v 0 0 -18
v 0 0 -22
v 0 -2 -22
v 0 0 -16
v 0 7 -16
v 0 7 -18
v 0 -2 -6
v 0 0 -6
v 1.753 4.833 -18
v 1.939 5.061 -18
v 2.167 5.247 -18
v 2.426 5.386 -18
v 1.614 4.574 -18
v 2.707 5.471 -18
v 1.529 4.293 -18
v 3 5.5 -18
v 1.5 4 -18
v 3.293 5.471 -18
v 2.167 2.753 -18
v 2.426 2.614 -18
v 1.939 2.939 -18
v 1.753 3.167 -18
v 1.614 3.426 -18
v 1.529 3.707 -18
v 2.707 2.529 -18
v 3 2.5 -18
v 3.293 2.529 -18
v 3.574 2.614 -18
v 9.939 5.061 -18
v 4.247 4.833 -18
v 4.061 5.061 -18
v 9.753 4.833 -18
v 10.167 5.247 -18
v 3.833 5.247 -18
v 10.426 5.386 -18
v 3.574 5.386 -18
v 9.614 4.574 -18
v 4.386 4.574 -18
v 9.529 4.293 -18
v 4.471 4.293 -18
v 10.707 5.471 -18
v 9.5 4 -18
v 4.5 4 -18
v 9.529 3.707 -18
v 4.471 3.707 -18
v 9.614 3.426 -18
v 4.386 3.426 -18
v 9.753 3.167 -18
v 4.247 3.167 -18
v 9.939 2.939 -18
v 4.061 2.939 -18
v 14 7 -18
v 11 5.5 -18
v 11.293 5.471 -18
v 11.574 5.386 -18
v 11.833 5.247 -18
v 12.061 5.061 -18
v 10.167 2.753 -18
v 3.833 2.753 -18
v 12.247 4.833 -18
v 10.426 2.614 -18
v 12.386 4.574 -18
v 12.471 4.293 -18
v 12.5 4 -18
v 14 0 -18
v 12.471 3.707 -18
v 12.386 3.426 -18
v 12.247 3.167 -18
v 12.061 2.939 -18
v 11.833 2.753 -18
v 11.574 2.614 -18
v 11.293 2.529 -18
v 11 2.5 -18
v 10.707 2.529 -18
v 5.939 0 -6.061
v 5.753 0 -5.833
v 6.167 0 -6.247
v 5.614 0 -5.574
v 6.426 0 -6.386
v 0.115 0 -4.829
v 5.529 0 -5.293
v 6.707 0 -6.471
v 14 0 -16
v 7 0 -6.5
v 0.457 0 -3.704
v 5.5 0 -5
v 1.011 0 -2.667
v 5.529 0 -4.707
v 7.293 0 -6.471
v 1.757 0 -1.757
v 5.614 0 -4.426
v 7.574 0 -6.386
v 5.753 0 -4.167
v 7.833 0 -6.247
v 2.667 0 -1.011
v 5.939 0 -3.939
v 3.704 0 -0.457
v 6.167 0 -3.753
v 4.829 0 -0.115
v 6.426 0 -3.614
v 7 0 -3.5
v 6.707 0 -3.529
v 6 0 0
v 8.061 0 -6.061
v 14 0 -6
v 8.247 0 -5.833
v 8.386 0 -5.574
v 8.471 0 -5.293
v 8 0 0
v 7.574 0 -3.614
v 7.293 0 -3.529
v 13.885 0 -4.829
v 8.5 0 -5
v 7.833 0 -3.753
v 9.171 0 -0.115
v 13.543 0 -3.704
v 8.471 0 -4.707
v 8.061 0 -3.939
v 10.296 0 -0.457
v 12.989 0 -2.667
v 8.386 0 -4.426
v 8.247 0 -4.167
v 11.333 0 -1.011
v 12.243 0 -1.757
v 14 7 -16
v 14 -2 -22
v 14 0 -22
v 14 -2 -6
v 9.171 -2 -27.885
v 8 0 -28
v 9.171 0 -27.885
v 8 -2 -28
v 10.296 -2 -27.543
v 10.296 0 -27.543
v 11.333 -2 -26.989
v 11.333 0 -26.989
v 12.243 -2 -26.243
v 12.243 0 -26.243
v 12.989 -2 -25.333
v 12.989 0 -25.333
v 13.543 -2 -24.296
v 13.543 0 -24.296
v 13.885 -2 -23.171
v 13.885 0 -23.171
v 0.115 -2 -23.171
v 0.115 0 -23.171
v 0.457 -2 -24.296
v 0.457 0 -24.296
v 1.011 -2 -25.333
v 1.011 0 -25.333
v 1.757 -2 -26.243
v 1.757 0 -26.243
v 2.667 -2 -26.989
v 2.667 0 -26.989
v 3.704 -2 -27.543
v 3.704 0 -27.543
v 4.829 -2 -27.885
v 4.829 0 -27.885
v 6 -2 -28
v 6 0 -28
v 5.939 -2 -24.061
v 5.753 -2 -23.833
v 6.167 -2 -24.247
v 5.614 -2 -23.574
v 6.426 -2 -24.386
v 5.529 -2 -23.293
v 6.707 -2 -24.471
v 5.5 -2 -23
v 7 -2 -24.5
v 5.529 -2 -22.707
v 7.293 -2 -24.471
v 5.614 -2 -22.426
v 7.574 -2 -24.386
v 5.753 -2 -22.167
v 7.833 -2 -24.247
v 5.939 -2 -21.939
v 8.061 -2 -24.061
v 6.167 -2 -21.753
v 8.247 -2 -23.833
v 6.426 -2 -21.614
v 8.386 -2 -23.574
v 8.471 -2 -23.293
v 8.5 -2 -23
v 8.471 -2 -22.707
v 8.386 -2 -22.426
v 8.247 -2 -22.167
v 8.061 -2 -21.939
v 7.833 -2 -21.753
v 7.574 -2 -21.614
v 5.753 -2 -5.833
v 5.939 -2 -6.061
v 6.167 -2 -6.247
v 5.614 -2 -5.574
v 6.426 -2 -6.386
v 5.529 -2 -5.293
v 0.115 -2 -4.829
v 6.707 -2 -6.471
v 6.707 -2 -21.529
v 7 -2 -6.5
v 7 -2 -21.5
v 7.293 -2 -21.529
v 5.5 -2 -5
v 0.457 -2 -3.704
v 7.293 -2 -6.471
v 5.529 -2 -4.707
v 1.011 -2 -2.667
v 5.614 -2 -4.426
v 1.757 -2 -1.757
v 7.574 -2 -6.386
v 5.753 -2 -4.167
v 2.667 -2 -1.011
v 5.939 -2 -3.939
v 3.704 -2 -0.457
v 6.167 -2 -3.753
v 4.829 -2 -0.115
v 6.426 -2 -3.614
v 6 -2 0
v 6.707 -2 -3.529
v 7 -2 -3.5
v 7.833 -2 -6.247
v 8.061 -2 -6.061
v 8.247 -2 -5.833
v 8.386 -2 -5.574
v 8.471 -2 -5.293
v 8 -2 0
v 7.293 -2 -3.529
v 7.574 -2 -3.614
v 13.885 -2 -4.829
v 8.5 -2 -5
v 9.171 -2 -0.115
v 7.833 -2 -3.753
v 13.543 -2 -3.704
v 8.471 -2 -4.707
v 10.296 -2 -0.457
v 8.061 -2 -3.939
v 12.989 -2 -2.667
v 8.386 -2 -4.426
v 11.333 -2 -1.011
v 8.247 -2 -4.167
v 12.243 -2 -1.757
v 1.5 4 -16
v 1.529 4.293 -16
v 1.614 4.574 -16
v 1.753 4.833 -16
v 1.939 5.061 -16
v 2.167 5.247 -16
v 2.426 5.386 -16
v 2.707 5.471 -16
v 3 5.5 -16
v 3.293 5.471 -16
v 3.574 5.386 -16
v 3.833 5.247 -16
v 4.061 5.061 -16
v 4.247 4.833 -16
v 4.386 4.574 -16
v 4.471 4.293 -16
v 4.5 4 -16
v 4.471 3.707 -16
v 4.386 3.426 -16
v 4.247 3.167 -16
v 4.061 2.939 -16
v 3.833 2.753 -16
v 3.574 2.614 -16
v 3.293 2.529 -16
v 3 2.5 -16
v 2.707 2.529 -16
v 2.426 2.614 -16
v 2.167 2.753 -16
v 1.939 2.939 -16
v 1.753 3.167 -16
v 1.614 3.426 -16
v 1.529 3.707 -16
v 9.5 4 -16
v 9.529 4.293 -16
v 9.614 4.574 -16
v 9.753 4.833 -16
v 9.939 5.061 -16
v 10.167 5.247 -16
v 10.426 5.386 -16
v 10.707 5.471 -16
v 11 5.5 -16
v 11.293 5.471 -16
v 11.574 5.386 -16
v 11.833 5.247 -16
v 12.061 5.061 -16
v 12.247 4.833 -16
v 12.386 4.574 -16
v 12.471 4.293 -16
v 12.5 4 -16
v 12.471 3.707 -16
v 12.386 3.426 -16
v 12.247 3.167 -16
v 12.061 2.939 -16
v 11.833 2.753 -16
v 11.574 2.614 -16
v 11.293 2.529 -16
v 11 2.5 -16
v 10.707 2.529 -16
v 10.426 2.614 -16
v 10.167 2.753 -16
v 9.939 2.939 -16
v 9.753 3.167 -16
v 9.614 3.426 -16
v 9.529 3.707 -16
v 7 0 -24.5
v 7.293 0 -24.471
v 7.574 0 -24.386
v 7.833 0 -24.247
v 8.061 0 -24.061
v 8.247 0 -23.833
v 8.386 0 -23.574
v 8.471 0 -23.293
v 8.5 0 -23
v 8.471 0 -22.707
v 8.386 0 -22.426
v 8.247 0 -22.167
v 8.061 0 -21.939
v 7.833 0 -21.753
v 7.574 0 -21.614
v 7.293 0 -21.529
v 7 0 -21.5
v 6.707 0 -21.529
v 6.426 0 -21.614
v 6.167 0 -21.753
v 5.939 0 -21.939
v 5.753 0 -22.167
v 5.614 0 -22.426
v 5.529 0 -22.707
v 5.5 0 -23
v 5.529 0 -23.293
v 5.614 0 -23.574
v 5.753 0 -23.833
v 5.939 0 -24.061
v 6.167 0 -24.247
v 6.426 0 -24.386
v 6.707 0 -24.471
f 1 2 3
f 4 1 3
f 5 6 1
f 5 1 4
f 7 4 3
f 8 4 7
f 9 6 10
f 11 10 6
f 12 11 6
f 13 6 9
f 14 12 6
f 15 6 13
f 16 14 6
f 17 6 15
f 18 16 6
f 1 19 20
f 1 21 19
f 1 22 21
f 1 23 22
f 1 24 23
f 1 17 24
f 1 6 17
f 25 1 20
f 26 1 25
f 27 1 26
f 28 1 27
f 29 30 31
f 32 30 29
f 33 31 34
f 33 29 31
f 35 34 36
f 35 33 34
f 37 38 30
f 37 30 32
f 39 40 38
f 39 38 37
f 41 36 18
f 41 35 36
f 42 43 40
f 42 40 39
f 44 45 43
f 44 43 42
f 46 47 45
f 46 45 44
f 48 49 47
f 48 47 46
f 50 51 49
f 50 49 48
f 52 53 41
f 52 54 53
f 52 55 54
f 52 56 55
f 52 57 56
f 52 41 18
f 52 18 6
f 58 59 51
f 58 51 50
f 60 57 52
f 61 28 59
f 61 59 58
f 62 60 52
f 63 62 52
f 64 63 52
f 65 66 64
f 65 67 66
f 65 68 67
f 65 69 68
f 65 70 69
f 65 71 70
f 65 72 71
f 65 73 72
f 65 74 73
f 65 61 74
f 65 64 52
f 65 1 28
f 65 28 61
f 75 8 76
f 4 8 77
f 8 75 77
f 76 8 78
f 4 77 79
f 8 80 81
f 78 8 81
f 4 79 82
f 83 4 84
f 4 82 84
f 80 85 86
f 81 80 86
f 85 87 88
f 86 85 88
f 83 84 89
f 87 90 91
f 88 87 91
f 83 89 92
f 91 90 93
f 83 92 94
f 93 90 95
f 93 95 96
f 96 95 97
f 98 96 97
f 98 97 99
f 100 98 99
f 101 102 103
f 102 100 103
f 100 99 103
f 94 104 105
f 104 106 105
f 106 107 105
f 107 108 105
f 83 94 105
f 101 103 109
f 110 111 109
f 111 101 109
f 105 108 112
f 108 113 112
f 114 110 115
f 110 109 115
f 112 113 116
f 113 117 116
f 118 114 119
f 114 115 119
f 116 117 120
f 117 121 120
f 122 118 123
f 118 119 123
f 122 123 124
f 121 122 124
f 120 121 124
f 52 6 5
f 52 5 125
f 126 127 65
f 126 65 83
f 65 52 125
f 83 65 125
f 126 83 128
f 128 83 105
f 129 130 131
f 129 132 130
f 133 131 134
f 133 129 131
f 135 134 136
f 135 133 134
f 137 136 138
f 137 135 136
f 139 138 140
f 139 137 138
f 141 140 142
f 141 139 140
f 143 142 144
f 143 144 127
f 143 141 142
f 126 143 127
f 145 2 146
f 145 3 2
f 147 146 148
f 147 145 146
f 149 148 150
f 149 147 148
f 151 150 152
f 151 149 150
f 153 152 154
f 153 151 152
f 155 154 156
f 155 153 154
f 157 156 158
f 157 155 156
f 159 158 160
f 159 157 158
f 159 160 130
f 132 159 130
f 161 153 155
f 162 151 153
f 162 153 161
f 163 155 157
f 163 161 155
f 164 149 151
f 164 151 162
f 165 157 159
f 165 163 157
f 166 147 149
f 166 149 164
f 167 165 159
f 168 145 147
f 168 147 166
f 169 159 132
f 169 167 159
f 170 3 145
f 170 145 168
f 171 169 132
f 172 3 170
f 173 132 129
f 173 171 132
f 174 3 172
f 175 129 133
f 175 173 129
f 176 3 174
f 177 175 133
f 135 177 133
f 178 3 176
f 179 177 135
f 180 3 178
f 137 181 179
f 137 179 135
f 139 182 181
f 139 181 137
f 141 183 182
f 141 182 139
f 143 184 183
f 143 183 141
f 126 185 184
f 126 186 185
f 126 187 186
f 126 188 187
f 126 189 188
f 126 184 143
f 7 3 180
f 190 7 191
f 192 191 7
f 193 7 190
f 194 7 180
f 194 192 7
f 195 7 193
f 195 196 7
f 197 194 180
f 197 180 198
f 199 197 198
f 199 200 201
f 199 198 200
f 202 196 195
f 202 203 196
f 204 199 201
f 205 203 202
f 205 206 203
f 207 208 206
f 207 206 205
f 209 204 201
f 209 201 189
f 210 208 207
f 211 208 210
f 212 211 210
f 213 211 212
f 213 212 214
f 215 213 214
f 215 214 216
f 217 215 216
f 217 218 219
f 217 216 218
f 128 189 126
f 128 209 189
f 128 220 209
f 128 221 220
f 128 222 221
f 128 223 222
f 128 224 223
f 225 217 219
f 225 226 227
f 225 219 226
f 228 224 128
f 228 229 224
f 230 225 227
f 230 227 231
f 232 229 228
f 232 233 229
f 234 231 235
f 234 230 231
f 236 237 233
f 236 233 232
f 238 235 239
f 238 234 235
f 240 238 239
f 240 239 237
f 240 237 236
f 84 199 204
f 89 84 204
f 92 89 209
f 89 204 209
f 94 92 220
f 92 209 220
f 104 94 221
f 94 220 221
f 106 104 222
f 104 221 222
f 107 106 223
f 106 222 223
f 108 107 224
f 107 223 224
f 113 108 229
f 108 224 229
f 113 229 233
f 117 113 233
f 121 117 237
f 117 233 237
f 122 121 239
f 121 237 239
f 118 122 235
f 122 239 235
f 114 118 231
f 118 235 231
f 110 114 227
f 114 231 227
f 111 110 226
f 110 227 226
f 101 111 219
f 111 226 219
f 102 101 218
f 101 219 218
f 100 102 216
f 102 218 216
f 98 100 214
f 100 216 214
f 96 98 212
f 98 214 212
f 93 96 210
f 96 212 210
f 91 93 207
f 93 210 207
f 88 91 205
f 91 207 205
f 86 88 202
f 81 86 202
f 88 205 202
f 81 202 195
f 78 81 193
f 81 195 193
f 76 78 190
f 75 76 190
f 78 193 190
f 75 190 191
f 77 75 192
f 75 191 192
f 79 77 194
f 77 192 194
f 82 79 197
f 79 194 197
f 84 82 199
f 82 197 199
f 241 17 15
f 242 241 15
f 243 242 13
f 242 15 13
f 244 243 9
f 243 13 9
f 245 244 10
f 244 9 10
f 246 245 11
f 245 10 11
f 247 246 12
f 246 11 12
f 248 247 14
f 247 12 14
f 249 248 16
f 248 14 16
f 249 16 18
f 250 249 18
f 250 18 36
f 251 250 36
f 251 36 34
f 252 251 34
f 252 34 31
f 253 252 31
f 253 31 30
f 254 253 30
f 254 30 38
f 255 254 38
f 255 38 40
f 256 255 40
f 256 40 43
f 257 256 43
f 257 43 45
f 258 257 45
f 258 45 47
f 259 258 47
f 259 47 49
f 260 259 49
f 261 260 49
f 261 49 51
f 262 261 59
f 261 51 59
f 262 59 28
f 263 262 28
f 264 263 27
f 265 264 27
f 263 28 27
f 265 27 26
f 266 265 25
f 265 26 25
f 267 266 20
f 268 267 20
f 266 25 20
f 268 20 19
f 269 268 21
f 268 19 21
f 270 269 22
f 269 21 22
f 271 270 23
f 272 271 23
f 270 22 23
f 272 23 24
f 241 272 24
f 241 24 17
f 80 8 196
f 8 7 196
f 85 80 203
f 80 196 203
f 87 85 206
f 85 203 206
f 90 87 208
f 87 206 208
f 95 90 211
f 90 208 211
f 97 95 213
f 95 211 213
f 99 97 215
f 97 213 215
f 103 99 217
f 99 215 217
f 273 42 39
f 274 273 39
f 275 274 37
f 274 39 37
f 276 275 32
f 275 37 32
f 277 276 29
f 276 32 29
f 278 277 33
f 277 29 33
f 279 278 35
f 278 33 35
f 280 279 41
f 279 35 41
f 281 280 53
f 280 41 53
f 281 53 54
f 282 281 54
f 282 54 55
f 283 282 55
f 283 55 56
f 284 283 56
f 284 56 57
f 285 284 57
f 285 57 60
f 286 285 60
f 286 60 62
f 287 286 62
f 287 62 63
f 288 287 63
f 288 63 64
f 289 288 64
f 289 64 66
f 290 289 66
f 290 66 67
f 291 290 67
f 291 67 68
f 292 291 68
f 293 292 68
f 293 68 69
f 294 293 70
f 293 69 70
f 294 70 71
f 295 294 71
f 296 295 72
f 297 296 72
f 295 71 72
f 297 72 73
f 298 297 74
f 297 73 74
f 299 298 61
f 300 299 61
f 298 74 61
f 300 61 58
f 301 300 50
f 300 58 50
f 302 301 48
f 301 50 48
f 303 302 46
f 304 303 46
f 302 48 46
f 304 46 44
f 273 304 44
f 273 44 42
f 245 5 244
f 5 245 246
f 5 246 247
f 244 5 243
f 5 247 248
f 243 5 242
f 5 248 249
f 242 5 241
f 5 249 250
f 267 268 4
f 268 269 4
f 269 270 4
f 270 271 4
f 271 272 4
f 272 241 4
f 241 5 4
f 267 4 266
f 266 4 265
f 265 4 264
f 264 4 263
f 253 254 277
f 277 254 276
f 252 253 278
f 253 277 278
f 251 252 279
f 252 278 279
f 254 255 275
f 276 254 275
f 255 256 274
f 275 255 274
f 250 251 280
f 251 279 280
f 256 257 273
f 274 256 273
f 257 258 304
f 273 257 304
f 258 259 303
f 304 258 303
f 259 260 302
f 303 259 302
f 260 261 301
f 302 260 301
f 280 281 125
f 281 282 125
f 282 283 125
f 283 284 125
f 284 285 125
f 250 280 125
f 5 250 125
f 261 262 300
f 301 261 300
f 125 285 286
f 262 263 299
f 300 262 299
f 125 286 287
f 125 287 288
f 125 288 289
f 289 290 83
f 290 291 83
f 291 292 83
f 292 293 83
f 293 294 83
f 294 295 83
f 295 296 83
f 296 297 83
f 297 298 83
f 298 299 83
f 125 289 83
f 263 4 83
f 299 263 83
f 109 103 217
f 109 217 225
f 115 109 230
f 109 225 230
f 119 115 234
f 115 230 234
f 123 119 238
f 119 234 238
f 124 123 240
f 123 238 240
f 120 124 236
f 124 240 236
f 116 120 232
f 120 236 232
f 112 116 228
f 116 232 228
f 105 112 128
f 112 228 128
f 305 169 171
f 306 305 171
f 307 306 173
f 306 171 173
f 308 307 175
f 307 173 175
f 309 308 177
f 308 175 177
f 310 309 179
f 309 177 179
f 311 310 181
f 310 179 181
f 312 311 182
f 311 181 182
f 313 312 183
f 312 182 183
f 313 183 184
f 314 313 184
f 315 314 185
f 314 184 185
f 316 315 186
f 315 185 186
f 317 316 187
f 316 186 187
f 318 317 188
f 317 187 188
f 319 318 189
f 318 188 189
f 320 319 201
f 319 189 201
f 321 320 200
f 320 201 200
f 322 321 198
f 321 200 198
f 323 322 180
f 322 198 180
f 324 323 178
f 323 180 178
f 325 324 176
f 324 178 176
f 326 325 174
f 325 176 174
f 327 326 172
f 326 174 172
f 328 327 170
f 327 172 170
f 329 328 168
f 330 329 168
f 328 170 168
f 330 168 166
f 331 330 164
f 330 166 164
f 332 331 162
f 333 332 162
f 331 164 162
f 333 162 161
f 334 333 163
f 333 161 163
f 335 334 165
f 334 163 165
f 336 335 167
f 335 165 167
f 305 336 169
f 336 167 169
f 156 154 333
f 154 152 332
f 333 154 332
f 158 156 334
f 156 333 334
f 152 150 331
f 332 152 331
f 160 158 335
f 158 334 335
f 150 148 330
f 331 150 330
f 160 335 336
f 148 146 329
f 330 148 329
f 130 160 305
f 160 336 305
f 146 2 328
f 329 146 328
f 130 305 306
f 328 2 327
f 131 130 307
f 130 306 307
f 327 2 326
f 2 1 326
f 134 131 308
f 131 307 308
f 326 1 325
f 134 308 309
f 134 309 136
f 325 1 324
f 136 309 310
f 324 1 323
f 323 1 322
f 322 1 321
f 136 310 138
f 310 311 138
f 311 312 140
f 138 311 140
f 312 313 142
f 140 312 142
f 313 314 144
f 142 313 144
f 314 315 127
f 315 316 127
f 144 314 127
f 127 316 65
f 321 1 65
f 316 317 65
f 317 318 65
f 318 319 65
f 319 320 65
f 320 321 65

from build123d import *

# Parameters (mm, degrees)
SKETCH_1_W          = 14
SKETCH_1_H          = 28
EXTRUDE_1_DEPTH     = 2
SKETCH_2_R          = 1.5
CUT_EXTRUDE_1_DEPTH = 2
SKETCH_3_W          = 14
SKETCH_3_H          = 2
EXTRUDE_2_DEPTH     = 7
FILLET_1_R          = 6
SKETCH_4_R          = 1.5
CUT_EXTRUDE_2_DEPTH = 15


with BuildPart() as part:
    # Эскиз1 → Бобышка-Вытянуть1 (new body)
    with BuildSketch(Plane.XZ):
        with Locations((7, -14)):
            Rectangle(SKETCH_1_W, SKETCH_1_H)
    extrude(amount=EXTRUDE_1_DEPTH)

    # Эскиз2 → Вырез-Вытянуть1 (cut)
    with BuildSketch(Plane.XZ.offset(2)):
        with Locations(Location((7, -5, 0), (0, 0, 270))):
            Circle(SKETCH_2_R)
        with Locations(Location((7, -23, 0), (0, 0, 270))):
            Circle(SKETCH_2_R)
    extrude(amount=-CUT_EXTRUDE_1_DEPTH, mode=Mode.SUBTRACT)

    # Эскиз3 → Бобышка-Вытянуть2 (add)
    with BuildSketch(Plane(origin=(0, 0, 0), x_dir=(1, 0, 0), z_dir=(0, 1, 0))):
        with Locations((7, 17)):
            Rectangle(SKETCH_3_W, SKETCH_3_H)
    extrude(amount=EXTRUDE_2_DEPTH)

    # Скругление1
    fillet_1_edges = [part.edges().sort_by_distance(p)[0] for p in [
        (0, -1, 0),
        (14, -1, 0),
        (14, -1, -28),
        (0, -1, -28),
    ]]
    fillet(fillet_1_edges, radius=FILLET_1_R)

    # Эскиз4 → Вырез-Вытянуть2 (cut)
    with BuildSketch(Plane(origin=(0, 0, -18), x_dir=(-1, 0, 0), z_dir=(0, 0, -1))):
        with Locations((-11, 4)):
            Circle(SKETCH_4_R)
        with Locations((-3, 4)):
            Circle(SKETCH_4_R)
    extrude(amount=-CUT_EXTRUDE_2_DEPTH, mode=Mode.SUBTRACT)


solid = part.part
